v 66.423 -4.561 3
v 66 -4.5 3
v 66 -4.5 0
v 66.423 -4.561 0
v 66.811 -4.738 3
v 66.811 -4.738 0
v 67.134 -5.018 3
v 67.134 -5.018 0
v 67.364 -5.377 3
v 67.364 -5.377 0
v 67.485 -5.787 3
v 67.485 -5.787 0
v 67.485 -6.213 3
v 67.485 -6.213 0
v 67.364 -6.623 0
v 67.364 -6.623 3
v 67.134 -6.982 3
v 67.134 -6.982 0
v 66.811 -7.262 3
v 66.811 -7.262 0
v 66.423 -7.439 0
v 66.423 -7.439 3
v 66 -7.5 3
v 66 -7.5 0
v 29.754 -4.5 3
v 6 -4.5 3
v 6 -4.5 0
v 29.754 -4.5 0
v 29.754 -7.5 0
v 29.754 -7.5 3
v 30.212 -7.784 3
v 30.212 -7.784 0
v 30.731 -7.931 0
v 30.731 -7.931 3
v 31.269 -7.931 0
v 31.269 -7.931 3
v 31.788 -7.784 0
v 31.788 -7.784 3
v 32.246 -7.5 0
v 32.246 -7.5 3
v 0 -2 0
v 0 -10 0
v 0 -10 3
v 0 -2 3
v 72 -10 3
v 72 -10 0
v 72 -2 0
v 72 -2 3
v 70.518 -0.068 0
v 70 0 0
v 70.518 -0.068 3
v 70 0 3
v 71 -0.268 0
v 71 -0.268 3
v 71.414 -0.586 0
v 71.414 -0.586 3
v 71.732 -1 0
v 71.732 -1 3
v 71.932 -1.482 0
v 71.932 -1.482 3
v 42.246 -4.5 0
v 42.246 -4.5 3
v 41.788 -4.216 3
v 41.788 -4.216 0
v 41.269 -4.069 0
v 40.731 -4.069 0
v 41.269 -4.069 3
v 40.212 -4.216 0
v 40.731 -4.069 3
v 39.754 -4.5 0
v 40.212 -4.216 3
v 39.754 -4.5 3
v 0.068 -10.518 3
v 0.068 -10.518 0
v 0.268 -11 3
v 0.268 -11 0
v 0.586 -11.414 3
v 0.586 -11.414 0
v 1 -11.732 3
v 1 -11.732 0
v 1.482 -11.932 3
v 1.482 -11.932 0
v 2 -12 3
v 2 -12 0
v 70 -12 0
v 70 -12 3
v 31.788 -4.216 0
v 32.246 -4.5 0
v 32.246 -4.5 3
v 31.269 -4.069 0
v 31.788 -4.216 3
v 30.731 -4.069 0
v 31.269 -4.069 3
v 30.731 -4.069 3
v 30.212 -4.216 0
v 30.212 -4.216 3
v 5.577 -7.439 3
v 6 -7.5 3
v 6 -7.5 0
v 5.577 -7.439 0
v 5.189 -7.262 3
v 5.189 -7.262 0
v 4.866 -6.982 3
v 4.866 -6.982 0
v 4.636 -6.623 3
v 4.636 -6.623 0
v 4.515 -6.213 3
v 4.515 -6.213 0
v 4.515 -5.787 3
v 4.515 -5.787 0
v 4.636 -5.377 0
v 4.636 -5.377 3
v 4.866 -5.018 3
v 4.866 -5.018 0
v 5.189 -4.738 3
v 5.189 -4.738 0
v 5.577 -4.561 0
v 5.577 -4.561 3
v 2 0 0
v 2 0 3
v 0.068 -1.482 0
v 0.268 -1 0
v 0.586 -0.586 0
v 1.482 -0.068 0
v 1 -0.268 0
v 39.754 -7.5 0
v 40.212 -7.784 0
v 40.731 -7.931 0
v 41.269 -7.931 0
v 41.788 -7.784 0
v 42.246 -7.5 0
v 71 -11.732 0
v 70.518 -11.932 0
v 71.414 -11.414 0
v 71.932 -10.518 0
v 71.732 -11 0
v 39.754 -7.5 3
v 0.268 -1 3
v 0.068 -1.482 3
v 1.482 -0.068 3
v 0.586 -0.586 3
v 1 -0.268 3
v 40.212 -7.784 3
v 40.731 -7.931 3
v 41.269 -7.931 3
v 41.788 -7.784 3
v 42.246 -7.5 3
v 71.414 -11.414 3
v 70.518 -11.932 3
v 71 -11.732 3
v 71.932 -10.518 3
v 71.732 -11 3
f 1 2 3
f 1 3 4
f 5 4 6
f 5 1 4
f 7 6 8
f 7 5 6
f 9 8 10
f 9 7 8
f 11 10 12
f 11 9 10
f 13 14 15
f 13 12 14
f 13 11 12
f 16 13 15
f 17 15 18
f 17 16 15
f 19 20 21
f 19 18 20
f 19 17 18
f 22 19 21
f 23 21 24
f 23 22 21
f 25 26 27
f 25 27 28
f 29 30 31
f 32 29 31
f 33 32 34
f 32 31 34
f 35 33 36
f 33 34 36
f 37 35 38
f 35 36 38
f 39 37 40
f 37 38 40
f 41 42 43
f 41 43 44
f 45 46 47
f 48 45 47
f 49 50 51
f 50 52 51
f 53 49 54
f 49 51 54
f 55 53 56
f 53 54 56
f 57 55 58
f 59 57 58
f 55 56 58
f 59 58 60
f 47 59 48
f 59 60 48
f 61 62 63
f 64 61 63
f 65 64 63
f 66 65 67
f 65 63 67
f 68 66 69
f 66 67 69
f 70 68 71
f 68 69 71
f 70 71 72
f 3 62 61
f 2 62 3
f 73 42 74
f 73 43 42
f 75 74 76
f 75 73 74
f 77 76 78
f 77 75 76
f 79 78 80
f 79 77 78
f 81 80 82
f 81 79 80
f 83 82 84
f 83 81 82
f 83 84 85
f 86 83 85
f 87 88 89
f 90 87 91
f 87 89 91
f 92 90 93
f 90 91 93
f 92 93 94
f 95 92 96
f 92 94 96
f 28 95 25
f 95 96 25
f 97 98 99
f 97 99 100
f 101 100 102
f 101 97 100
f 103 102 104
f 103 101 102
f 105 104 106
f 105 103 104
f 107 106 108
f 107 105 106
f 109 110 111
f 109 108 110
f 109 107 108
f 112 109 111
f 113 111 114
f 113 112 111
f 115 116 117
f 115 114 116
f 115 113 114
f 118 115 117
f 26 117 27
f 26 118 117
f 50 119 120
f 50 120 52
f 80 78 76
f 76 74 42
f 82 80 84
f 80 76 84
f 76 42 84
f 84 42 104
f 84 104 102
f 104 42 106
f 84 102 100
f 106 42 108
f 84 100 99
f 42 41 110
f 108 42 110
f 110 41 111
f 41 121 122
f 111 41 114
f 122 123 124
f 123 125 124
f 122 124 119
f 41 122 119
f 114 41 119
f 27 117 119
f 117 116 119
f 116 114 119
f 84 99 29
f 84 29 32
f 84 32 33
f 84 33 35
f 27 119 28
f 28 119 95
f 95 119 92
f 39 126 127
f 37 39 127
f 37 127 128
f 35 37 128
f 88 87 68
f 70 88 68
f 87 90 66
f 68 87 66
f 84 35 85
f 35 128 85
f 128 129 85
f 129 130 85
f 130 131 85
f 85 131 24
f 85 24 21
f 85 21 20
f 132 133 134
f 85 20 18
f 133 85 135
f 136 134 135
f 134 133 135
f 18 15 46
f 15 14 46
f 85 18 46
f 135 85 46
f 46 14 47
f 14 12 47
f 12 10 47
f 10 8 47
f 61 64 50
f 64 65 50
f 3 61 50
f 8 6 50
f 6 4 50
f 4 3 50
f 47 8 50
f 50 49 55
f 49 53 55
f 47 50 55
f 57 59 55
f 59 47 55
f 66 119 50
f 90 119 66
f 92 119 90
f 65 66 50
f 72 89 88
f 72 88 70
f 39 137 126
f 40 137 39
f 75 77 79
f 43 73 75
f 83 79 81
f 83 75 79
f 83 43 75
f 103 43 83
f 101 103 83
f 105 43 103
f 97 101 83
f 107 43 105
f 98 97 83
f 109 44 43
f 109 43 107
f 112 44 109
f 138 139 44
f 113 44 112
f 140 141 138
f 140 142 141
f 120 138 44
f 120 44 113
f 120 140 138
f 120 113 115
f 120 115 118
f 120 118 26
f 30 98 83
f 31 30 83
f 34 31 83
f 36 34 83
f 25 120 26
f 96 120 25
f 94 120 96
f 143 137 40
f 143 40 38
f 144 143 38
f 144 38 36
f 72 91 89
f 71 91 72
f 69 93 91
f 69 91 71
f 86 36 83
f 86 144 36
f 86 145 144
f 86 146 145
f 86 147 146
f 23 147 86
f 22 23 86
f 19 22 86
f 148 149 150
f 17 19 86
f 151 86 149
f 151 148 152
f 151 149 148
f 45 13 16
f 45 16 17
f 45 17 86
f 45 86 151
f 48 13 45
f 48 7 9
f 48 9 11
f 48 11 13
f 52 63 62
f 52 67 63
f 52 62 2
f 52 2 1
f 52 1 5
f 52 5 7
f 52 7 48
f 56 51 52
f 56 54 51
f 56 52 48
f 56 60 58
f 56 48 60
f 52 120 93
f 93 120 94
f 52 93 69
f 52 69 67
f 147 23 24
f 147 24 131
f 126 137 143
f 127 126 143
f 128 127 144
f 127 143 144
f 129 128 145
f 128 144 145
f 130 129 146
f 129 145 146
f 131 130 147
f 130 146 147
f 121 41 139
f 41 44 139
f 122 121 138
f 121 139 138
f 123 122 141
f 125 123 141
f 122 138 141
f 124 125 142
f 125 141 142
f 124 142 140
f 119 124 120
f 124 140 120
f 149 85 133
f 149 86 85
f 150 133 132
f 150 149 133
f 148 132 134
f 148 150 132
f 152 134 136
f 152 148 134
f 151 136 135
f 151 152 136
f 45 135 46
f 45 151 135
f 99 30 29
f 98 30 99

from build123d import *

# Parameters (mm, degrees)
SKETCH_1_W          = 72
SKETCH_1_H          = 12
EXTRUDE_1_DEPTH     = 3
CUT_EXTRUDE_1_DEPTH = 74.054773971
SKETCH_3_R          = 1.95
CUT_EXTRUDE_2_DEPTH = 74.054773971
FILLET_1_R          = 2


with BuildPart() as part:
    # 草图1 → 凸台-拉伸1 (new body)
    with BuildSketch(Plane.XY):
        with Locations((36, -6)):
            Rectangle(SKETCH_1_W, SKETCH_1_H)
    extrude(amount=EXTRUDE_1_DEPTH)

    # 草图2 → 切除-拉伸1 (cut, through all)
    with BuildSketch(Plane.XY.offset(3)):
        with BuildLine():
            Line((6, -4.5), (66, -4.5))
            ThreePointArc((66, -4.5), (67.5, -6), (66, -7.5))
            Line((66, -7.5), (6, -7.5))
            ThreePointArc((6, -7.5), (4.5, -6), (6, -4.5))
        make_face()
    extrude(amount=-CUT_EXTRUDE_1_DEPTH, mode=Mode.SUBTRACT)

    # 草图3 → 切除-拉伸2 (cut, through all)
    with BuildSketch(Plane.XY.offset(3)):
        with Locations((41, -6)):
            Circle(SKETCH_3_R)
        with Locations((31, -6)):
            Circle(SKETCH_3_R)
    extrude(amount=-CUT_EXTRUDE_2_DEPTH, mode=Mode.SUBTRACT)

    # 圆角1
    fillet_1_edges = [part.edges().sort_by_distance(p)[0] for p in [
        (0, 0, 1.5),
        (72, 0, 1.5),
        (72, -12, 1.5),
        (0, -12, 1.5),
    ]]
    fillet(fillet_1_edges, radius=FILLET_1_R)


solid = part.part
